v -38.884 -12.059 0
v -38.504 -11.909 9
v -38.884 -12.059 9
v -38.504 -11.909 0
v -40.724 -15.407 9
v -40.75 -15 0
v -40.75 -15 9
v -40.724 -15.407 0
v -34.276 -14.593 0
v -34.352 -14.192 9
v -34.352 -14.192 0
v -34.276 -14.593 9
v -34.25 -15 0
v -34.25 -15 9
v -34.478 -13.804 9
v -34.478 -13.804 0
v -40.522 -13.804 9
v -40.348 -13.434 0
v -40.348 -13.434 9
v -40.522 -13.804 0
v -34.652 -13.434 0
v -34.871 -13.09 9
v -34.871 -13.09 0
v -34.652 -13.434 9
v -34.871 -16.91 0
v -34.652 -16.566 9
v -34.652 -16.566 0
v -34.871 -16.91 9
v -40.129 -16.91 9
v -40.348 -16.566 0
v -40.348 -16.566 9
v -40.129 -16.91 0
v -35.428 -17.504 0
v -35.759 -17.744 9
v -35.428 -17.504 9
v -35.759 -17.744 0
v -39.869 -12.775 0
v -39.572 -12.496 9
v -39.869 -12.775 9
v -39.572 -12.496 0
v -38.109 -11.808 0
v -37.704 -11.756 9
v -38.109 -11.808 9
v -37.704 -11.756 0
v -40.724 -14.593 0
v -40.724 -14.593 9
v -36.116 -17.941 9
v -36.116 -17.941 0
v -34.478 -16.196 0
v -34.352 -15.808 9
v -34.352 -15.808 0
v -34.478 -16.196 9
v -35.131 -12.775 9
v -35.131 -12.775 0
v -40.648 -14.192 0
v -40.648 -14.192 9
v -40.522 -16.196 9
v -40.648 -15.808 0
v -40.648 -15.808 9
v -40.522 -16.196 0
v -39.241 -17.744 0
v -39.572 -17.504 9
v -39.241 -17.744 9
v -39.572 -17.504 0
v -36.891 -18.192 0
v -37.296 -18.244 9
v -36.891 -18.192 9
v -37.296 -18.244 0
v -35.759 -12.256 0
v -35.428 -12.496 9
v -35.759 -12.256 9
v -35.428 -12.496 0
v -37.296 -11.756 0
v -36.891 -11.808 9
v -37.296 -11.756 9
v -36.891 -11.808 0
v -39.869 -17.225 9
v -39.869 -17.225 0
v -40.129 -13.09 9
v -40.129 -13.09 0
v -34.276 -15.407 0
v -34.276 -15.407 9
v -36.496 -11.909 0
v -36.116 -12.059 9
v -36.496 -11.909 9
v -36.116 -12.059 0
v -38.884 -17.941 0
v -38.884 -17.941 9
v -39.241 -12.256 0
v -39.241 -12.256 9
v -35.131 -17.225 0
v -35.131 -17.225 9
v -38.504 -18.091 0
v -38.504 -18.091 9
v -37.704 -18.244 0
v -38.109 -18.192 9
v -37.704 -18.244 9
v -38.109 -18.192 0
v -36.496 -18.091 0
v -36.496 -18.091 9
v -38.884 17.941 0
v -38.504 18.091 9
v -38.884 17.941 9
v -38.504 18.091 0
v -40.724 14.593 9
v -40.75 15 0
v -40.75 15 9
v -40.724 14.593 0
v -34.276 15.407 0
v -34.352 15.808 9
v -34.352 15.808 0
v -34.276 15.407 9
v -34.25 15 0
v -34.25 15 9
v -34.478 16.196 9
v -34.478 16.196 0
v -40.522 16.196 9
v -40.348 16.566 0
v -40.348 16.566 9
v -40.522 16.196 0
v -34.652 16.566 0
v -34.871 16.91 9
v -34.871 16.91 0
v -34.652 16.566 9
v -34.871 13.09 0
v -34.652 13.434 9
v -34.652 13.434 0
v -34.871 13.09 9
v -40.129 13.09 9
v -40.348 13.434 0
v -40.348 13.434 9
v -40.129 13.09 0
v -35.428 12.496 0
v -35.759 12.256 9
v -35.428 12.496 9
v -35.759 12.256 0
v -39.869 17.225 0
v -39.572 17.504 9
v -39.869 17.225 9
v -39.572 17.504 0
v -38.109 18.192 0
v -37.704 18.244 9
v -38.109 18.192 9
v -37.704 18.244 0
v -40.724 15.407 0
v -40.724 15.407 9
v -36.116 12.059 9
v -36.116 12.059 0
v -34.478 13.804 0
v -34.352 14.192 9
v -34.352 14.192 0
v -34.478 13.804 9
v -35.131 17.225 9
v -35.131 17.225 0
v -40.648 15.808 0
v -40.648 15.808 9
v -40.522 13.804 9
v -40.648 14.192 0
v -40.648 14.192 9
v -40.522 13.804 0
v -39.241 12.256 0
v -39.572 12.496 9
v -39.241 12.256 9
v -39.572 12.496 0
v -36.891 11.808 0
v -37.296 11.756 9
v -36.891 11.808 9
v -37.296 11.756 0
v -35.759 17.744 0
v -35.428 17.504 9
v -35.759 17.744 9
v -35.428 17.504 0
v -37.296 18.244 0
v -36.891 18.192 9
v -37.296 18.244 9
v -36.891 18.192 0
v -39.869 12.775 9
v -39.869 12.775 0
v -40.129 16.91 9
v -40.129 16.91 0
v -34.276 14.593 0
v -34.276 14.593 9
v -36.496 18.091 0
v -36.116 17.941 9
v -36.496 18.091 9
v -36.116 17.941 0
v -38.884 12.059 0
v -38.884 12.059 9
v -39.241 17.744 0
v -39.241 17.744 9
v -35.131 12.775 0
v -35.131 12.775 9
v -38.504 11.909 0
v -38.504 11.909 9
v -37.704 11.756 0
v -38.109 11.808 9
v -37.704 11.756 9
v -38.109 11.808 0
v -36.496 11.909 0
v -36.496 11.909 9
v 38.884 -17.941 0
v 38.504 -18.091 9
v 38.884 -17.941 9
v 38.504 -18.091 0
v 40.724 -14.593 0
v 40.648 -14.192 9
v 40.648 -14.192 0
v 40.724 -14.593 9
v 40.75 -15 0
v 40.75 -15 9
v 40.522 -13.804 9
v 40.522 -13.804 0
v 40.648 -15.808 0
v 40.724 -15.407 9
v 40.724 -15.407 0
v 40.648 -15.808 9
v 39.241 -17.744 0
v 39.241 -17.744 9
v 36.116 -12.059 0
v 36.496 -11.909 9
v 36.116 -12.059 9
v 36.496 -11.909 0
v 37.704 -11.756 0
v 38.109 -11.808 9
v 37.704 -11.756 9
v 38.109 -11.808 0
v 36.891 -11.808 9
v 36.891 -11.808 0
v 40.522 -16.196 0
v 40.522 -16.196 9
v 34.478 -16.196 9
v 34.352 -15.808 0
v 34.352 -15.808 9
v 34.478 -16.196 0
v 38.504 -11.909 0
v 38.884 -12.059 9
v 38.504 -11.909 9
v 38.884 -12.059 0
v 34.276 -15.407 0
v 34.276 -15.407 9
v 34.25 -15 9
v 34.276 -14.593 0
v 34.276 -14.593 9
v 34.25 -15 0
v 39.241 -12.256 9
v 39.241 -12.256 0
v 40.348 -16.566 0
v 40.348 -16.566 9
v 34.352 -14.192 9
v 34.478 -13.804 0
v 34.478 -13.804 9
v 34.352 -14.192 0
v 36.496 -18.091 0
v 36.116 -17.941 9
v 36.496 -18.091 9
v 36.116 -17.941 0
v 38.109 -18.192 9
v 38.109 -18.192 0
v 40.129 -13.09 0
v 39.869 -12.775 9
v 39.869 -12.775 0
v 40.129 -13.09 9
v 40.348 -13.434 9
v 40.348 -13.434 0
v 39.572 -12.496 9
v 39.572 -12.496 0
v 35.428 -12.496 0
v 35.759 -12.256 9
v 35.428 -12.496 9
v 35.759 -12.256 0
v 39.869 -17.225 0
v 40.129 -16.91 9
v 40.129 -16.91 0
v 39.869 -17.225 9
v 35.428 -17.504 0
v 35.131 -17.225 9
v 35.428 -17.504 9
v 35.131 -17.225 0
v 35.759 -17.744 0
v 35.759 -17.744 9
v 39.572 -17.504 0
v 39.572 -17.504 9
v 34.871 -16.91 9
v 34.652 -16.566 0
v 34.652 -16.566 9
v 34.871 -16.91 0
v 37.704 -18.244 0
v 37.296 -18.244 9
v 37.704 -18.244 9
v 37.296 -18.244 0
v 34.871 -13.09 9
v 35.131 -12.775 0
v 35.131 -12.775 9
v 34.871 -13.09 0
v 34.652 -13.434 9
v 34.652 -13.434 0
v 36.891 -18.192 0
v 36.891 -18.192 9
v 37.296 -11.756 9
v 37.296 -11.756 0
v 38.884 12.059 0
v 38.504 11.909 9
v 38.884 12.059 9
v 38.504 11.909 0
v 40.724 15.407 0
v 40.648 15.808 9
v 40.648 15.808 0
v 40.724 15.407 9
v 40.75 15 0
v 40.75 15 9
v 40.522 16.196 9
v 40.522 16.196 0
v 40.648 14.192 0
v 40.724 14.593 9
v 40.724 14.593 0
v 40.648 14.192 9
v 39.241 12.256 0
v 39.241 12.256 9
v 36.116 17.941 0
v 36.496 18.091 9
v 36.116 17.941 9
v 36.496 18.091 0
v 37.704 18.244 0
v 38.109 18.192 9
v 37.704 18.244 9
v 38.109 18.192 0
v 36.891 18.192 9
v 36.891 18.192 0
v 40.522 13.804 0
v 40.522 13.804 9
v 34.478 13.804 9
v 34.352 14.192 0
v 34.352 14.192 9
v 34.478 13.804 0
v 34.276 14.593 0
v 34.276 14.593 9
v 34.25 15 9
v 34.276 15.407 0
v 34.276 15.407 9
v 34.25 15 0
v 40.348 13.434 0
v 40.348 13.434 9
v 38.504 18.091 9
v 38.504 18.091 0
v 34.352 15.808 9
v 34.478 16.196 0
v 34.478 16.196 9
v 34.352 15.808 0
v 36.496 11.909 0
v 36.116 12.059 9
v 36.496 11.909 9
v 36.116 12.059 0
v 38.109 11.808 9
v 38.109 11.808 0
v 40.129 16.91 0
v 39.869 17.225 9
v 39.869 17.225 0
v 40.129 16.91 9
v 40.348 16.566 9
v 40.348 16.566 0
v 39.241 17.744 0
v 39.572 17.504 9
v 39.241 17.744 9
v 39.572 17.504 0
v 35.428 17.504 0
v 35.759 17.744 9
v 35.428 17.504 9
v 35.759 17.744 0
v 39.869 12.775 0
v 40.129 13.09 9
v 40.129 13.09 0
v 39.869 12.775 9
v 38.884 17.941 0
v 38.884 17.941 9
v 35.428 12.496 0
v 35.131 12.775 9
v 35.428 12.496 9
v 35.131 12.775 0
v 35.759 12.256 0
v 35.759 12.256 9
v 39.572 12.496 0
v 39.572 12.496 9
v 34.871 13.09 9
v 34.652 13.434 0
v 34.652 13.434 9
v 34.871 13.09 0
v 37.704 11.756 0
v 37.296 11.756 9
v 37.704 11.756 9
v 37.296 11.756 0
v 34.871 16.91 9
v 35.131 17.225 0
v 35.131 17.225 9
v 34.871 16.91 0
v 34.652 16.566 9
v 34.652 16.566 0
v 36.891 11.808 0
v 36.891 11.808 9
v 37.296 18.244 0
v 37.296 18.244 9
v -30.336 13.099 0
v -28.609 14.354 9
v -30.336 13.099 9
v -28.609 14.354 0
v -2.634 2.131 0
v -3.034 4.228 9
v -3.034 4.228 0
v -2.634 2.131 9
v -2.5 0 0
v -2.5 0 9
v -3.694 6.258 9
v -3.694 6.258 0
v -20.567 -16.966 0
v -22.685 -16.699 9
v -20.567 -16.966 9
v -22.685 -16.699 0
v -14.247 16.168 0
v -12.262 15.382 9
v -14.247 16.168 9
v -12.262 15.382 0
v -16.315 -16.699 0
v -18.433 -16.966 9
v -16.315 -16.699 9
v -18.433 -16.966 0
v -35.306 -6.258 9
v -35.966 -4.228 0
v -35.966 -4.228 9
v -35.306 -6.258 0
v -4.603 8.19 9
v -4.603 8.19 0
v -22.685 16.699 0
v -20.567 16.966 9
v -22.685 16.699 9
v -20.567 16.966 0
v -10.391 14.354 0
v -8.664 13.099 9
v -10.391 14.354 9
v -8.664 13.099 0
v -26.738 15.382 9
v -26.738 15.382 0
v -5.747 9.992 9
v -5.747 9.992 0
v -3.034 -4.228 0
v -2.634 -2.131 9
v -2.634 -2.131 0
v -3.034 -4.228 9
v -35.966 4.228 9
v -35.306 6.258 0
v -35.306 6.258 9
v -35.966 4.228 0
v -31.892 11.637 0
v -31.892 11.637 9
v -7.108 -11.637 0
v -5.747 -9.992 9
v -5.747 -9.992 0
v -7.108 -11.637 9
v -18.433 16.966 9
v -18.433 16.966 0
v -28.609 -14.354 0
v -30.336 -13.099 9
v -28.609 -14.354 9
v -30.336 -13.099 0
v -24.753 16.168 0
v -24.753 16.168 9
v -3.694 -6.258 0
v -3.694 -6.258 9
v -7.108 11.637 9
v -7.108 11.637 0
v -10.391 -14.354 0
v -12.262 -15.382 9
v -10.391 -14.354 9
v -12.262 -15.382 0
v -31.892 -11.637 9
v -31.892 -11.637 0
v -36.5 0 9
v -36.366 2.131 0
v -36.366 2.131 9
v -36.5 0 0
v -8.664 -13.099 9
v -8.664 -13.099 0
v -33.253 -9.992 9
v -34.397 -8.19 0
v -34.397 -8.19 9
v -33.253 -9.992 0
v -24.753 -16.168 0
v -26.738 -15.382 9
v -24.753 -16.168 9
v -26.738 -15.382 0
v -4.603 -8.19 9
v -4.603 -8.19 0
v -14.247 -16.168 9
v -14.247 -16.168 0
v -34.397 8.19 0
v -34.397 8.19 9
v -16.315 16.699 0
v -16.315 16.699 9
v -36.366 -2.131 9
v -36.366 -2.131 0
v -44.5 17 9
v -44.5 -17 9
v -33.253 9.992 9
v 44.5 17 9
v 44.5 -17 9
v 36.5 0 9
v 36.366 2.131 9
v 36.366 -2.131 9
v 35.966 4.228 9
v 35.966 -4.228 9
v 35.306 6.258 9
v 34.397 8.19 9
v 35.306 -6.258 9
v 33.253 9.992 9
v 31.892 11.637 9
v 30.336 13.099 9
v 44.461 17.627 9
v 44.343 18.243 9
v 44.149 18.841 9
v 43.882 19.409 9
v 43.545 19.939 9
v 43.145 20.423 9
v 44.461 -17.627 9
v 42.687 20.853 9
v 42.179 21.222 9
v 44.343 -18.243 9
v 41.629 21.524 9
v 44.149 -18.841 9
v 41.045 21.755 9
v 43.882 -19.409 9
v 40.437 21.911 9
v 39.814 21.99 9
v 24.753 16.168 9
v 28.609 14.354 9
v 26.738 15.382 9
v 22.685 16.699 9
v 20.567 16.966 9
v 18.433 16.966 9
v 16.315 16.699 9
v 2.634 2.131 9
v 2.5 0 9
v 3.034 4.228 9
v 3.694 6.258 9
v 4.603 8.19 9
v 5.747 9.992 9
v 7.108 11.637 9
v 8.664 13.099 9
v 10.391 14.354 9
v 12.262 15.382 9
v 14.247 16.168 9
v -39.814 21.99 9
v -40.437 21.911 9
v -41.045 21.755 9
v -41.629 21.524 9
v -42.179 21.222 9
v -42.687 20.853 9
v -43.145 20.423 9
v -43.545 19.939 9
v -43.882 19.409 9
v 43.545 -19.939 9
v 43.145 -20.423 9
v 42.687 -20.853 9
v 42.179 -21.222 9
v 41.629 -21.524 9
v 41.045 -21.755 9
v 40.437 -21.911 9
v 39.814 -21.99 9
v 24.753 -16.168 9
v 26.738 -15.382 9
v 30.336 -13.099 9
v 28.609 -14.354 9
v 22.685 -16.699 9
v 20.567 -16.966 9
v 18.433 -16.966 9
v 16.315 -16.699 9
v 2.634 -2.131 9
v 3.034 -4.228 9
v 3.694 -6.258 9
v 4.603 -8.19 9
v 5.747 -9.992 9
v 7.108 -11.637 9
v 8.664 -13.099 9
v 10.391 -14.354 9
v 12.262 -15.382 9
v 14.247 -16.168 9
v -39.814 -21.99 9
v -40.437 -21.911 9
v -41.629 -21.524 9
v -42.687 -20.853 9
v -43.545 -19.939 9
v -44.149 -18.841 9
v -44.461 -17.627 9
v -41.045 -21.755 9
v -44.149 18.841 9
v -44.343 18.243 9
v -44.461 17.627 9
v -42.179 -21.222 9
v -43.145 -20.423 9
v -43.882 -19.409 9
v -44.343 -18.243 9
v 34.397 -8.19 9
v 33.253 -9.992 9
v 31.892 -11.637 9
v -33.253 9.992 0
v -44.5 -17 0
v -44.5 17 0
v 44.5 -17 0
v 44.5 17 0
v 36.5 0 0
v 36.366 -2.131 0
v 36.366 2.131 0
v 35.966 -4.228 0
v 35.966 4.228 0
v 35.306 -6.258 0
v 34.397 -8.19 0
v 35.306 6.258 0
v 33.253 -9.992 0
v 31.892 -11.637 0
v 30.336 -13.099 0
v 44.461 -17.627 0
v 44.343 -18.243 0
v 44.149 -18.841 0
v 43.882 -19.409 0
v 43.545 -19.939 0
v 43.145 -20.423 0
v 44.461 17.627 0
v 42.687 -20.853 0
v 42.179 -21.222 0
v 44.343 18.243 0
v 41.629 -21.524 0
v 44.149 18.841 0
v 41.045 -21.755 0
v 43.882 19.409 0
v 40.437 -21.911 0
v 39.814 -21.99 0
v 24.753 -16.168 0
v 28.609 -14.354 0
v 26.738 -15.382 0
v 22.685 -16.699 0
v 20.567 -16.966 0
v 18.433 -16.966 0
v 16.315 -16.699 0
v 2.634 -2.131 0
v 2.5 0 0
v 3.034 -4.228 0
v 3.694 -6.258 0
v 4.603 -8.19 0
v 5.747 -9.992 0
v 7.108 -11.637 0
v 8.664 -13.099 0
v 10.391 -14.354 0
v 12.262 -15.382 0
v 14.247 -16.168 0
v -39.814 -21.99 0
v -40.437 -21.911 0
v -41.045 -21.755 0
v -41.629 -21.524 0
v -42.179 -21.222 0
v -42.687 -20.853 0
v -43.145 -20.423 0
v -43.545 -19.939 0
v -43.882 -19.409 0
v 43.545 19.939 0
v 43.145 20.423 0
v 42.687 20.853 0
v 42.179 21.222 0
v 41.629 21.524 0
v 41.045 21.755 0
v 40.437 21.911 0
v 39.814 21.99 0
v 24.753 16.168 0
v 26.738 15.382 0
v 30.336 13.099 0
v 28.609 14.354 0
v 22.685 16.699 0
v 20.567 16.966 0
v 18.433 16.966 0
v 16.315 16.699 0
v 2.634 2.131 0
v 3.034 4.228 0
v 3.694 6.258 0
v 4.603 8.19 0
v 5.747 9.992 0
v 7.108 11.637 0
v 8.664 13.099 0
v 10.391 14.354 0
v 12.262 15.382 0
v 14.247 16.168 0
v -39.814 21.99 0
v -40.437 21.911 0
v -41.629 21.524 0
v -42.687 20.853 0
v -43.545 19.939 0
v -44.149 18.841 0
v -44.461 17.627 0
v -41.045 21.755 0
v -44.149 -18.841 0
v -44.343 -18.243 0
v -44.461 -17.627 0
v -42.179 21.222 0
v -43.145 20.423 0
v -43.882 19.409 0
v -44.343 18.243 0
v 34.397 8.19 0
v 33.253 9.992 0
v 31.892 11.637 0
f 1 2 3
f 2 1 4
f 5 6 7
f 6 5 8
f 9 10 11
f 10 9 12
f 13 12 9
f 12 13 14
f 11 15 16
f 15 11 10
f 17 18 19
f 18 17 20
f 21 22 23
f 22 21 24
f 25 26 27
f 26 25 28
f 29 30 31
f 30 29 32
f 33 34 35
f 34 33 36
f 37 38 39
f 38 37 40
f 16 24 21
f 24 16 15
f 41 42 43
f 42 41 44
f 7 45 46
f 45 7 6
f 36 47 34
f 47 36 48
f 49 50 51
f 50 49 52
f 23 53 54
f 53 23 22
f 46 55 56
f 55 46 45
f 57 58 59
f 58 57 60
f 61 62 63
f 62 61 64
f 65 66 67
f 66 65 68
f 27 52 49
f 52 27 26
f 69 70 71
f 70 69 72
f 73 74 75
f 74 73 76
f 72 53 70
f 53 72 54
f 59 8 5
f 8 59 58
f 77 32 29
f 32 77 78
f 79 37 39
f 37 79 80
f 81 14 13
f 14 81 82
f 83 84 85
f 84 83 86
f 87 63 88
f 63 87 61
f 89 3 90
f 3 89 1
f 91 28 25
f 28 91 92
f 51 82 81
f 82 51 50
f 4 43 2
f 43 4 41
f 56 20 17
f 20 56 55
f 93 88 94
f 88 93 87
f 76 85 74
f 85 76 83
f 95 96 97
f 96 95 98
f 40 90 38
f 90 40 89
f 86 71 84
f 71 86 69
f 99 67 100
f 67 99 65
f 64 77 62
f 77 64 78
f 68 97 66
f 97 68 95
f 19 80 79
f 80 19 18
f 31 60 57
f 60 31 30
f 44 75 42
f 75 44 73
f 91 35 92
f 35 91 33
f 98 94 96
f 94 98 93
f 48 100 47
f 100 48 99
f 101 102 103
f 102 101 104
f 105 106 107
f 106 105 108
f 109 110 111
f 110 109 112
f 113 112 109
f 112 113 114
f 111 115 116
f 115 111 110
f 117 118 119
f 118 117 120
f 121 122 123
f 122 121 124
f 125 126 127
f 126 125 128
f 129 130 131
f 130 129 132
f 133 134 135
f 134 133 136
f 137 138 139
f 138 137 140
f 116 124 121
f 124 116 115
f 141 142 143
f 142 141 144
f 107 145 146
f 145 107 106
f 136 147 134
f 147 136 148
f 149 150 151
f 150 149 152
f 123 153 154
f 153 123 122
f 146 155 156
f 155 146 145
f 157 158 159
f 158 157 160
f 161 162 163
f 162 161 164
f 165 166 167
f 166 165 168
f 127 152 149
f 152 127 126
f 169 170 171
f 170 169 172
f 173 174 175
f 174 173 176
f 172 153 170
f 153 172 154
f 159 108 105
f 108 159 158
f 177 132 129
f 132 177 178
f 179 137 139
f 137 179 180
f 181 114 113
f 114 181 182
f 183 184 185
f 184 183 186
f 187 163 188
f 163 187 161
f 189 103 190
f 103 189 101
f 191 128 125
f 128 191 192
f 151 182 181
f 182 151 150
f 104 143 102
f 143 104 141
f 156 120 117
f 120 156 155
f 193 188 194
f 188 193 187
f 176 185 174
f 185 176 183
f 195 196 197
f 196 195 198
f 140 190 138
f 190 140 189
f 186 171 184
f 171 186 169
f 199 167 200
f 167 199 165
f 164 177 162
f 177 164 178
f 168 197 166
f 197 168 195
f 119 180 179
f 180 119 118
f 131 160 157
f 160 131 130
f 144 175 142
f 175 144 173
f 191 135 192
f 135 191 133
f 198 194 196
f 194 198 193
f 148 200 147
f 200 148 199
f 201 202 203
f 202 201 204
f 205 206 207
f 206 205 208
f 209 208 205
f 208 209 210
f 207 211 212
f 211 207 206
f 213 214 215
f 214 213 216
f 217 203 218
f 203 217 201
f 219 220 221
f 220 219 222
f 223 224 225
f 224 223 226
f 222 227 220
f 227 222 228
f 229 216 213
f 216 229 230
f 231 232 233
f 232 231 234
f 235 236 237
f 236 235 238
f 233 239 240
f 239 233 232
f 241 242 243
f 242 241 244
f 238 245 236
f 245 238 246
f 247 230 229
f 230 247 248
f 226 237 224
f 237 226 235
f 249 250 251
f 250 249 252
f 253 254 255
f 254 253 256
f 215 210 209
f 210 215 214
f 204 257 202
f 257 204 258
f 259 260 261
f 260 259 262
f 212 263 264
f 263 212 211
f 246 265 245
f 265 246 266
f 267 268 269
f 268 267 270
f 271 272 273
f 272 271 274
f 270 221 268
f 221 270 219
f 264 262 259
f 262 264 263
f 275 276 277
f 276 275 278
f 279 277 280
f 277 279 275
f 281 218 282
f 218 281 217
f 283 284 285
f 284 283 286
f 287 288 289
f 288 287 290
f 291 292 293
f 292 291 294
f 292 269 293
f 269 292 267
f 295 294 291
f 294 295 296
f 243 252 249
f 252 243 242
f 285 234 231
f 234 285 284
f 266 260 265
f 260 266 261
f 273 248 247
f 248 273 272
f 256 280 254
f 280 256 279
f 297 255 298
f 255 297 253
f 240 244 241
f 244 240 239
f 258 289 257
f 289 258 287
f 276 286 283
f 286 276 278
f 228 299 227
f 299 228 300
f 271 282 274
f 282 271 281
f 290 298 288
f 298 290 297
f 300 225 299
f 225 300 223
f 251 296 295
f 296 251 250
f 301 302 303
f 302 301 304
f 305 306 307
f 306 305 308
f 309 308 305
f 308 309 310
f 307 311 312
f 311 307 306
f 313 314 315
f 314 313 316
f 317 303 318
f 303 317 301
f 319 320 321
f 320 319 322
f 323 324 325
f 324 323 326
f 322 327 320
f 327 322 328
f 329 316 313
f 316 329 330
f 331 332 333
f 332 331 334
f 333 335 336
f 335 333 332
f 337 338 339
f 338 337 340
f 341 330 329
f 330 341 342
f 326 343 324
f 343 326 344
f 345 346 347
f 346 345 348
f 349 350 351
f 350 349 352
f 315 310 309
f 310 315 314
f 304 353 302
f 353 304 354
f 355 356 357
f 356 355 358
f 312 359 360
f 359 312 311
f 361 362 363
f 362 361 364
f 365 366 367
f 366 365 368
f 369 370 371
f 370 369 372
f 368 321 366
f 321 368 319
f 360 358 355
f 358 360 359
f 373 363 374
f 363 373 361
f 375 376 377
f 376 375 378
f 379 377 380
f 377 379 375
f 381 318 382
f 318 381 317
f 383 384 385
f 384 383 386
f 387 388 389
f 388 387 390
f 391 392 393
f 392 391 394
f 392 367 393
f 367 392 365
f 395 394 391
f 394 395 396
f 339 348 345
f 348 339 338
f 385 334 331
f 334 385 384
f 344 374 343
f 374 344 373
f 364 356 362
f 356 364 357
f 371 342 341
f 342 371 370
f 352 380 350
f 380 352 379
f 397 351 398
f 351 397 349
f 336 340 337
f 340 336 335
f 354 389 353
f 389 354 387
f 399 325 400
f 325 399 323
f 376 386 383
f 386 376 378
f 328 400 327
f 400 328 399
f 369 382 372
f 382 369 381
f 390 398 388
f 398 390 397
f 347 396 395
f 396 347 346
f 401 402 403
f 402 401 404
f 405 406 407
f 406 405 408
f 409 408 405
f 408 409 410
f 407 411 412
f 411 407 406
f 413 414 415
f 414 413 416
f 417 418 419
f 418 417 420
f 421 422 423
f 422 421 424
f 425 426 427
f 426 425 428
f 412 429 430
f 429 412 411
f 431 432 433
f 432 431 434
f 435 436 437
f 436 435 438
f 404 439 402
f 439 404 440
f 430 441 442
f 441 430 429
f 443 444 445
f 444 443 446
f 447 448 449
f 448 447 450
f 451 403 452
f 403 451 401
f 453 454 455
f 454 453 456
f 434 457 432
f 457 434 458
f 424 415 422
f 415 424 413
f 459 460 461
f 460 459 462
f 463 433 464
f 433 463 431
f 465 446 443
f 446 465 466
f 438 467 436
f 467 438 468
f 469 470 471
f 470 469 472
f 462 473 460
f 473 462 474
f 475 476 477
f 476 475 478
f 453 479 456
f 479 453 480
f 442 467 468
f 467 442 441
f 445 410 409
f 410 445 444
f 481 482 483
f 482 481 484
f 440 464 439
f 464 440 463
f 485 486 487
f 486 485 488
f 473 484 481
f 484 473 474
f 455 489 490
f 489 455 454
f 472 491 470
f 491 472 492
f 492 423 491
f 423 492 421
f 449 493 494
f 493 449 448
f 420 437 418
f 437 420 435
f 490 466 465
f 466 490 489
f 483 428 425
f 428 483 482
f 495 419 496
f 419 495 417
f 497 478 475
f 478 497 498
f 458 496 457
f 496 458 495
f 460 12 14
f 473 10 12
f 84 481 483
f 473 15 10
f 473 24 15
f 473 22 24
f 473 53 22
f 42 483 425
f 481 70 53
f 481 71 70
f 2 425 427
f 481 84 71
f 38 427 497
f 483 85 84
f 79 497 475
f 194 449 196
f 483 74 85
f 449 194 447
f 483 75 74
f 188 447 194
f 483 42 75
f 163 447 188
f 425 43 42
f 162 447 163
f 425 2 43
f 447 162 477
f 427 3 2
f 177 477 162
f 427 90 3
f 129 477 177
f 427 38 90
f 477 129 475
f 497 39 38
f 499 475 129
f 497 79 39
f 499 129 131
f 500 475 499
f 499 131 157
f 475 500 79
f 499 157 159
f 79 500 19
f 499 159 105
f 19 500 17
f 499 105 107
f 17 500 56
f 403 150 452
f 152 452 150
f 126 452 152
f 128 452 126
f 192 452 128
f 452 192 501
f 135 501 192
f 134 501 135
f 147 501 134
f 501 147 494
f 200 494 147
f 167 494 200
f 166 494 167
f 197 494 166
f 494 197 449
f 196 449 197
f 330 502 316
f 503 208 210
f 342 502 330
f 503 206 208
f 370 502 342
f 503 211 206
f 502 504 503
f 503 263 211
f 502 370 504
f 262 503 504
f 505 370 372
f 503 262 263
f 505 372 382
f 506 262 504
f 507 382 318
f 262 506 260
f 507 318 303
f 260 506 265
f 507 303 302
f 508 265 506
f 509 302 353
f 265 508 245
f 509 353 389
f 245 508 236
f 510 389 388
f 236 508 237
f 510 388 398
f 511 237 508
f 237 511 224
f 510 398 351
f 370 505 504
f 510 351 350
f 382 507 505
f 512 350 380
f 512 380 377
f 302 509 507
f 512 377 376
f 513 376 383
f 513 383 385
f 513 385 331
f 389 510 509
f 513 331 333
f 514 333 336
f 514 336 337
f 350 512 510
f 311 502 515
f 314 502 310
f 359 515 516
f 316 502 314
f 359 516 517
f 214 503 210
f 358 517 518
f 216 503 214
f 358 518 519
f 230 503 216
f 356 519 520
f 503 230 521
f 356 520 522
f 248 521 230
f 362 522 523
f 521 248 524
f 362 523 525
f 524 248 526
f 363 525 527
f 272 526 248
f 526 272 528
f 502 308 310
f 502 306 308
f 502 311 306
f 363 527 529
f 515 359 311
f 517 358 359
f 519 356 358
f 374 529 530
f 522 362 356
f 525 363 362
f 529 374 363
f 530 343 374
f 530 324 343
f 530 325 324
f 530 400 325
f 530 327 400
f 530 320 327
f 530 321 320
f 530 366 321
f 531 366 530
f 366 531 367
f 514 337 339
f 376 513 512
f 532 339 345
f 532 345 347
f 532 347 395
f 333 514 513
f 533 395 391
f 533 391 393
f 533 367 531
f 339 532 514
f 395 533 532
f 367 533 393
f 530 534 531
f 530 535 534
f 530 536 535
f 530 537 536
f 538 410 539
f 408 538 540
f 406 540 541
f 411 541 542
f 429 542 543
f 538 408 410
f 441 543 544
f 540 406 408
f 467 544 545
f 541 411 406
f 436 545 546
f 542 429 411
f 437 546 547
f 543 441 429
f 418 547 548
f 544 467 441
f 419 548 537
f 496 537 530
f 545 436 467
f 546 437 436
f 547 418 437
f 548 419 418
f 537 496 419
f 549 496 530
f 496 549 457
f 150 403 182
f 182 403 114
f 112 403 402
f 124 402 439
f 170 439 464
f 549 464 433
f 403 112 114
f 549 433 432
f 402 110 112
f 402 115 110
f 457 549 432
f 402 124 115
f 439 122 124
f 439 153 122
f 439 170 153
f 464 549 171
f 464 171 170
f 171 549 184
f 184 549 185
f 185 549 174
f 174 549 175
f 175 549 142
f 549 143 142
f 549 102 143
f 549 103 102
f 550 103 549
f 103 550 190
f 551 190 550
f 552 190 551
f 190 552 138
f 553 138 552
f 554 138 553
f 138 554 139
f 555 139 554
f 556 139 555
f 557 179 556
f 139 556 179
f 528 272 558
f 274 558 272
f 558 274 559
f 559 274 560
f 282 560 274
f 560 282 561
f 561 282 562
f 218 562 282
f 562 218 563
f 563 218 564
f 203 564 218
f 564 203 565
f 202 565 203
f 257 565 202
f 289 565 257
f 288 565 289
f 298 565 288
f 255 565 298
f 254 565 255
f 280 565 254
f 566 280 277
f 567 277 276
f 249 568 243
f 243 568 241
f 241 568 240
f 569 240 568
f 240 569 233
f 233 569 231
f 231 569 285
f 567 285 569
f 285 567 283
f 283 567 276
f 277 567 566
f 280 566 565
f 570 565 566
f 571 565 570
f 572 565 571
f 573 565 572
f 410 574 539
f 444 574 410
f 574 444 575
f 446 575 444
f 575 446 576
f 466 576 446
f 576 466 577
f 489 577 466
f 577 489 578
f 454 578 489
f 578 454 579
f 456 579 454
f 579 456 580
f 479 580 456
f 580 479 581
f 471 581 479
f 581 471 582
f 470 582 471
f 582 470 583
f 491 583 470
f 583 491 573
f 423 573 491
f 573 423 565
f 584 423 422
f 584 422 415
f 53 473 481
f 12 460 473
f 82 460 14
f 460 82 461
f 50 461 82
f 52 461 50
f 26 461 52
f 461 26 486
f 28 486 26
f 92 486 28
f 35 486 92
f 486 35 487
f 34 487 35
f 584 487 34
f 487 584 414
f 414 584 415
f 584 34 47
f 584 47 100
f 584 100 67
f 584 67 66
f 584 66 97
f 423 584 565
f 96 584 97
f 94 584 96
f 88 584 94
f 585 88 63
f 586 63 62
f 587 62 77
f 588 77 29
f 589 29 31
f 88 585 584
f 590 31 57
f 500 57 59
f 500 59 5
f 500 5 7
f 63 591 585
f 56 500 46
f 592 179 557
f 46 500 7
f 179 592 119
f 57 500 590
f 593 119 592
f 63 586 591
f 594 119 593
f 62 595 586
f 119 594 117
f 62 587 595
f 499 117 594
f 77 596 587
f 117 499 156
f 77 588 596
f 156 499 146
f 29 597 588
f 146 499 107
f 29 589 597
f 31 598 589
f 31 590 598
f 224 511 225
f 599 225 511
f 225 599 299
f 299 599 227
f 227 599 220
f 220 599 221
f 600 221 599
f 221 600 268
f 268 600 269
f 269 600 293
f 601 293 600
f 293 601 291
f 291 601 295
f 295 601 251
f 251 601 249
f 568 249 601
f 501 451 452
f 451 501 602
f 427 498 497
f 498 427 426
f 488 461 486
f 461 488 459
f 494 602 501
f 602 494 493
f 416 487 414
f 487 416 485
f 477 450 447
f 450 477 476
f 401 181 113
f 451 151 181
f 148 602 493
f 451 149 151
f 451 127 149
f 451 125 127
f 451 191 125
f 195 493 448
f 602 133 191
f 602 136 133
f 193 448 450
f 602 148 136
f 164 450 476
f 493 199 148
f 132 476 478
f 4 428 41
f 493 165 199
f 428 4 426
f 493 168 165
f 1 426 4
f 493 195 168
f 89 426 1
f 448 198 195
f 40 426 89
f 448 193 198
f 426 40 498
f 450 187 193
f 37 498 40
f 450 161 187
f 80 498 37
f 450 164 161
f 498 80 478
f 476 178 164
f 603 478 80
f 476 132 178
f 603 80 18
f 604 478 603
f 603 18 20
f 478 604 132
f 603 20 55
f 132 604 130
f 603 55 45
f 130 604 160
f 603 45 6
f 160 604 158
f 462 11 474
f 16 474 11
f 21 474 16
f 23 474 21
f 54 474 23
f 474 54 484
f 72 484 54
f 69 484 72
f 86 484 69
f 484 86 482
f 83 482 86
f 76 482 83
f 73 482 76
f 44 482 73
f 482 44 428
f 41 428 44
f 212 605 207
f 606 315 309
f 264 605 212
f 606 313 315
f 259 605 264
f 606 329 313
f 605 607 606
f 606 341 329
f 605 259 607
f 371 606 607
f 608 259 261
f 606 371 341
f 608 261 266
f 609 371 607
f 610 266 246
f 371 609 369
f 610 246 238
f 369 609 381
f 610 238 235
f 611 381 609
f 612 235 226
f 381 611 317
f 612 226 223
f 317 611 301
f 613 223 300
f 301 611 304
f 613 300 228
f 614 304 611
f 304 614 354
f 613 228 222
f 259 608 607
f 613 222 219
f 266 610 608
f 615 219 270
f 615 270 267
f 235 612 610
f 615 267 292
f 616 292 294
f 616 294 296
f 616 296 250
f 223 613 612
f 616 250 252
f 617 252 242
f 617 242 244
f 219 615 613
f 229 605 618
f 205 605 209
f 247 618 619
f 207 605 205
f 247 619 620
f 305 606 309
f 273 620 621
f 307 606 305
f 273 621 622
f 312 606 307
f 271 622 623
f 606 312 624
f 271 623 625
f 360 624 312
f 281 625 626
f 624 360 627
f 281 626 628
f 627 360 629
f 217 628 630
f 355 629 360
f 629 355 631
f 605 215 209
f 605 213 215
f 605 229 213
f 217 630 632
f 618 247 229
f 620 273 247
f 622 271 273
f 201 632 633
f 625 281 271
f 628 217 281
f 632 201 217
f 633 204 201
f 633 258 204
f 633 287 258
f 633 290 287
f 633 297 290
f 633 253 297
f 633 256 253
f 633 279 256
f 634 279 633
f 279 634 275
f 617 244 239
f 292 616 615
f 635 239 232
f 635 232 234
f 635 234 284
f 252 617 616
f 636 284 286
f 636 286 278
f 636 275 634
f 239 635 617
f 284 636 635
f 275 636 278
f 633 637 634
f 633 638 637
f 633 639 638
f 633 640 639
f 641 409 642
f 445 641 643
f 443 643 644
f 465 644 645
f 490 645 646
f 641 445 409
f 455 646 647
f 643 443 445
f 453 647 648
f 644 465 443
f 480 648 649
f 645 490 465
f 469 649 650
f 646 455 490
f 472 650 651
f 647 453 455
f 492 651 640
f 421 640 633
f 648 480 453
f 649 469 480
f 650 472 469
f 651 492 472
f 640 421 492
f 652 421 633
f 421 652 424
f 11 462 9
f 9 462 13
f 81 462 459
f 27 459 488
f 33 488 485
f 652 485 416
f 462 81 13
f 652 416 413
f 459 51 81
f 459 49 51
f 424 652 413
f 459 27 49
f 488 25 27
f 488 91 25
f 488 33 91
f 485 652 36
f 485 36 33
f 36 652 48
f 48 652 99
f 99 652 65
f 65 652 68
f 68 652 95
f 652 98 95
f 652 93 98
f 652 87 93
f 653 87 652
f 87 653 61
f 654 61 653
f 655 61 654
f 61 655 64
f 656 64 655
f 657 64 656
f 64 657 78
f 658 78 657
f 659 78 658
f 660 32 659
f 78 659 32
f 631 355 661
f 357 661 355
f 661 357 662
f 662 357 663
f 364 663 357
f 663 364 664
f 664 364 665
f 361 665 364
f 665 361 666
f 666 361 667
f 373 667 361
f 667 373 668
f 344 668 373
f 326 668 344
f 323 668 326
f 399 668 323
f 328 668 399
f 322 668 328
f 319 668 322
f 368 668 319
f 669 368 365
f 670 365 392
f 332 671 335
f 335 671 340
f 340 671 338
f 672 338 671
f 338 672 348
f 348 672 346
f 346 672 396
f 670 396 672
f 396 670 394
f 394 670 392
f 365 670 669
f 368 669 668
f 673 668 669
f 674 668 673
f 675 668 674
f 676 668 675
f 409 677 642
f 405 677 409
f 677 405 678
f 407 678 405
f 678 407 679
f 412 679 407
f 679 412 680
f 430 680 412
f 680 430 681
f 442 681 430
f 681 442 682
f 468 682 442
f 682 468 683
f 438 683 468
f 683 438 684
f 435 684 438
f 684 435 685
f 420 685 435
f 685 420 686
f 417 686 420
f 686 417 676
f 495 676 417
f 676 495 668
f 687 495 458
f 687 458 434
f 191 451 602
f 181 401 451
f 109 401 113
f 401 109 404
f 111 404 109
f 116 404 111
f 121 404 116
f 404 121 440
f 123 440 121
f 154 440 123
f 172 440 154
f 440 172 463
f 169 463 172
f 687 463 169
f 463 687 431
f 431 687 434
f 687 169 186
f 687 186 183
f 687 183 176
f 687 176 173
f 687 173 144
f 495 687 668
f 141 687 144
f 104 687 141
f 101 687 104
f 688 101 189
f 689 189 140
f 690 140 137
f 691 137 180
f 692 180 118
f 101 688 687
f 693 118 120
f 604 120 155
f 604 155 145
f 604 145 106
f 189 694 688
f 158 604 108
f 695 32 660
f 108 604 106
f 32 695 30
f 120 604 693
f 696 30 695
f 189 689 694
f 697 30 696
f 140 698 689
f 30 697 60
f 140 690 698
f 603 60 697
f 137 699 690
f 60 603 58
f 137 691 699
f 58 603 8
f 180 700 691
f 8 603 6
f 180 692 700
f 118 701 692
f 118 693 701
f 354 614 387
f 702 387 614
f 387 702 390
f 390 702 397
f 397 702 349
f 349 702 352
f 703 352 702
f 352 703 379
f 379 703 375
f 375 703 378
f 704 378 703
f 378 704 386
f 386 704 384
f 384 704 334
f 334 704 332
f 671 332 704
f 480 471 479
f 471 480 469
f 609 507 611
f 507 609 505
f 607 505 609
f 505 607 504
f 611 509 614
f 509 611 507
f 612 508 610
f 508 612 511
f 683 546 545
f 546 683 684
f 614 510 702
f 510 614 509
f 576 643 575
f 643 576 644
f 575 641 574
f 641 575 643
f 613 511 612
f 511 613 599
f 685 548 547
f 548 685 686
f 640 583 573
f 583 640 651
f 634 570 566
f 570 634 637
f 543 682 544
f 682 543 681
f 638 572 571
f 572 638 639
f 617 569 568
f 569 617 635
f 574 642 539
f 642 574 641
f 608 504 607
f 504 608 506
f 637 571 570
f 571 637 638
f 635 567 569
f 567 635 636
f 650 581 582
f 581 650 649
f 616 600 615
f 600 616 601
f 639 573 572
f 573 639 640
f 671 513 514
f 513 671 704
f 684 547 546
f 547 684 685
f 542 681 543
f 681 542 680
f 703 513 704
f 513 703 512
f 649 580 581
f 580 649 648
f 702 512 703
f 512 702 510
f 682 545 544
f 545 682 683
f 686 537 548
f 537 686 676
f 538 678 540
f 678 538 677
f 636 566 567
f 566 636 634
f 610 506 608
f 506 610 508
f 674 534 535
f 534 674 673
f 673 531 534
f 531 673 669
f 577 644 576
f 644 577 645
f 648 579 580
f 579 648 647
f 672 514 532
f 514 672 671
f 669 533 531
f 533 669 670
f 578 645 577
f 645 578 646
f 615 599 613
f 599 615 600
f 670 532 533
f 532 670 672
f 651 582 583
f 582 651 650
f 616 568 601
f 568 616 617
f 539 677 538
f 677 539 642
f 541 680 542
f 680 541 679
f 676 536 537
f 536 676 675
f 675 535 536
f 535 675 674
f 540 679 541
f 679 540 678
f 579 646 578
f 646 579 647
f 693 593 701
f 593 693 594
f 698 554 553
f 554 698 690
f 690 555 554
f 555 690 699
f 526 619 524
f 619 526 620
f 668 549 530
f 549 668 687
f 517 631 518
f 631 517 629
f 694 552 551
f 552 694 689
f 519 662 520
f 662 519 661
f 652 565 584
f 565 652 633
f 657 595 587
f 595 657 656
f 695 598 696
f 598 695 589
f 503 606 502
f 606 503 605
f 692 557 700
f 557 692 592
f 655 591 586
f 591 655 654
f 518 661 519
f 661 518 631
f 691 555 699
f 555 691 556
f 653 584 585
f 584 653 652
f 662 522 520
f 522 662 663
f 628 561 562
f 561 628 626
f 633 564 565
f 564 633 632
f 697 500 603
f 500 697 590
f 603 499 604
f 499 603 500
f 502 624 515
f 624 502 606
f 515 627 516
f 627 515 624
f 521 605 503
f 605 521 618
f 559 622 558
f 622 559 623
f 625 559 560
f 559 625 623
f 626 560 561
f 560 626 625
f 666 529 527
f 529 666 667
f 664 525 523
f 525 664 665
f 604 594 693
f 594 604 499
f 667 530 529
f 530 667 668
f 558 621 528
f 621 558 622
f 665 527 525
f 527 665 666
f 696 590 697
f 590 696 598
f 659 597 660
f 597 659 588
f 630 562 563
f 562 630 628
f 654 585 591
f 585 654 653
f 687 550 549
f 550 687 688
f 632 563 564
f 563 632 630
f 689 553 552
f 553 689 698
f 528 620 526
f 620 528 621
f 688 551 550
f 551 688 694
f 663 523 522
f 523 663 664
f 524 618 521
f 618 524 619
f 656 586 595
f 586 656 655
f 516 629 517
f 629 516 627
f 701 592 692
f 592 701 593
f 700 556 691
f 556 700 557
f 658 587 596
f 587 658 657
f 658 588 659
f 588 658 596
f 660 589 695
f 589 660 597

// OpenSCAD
$fn = 50;


difference() {
	union() {
		hull() {
			translate(v = [-39.5000000000, 17.0000000000, 0]) {
				cylinder(h = 9, r = 5);
			}
			translate(v = [39.5000000000, 17.0000000000, 0]) {
				cylinder(h = 9, r = 5);
			}
			translate(v = [-39.5000000000, -17.0000000000, 0]) {
				cylinder(h = 9, r = 5);
			}
			translate(v = [39.5000000000, -17.0000000000, 0]) {
				cylinder(h = 9, r = 5);
			}
		}
	}
	union() {
		#translate(v = [-37.5000000000, -15.0000000000, -100.0000000000]) {
			cylinder(h = 200, r = 3.2500000000);
		}
		#translate(v = [-37.5000000000, 15.0000000000, -100.0000000000]) {
			cylinder(h = 200, r = 3.2500000000);
		}
		#translate(v = [37.5000000000, -15.0000000000, -100.0000000000]) {
			cylinder(h = 200, r = 3.2500000000);
		}
		#translate(v = [37.5000000000, 15.0000000000, -100.0000000000]) {
			cylinder(h = 200, r = 3.2500000000);
		}
		#translate(v = [-19.5000000000, 0, 0]) {
			cylinder(h = 9, r = 17.0000000000);
		}
		#translate(v = [19.5000000000, 0, 0]) {
			cylinder(h = 9, r = 17.0000000000);
		}
	}
}
